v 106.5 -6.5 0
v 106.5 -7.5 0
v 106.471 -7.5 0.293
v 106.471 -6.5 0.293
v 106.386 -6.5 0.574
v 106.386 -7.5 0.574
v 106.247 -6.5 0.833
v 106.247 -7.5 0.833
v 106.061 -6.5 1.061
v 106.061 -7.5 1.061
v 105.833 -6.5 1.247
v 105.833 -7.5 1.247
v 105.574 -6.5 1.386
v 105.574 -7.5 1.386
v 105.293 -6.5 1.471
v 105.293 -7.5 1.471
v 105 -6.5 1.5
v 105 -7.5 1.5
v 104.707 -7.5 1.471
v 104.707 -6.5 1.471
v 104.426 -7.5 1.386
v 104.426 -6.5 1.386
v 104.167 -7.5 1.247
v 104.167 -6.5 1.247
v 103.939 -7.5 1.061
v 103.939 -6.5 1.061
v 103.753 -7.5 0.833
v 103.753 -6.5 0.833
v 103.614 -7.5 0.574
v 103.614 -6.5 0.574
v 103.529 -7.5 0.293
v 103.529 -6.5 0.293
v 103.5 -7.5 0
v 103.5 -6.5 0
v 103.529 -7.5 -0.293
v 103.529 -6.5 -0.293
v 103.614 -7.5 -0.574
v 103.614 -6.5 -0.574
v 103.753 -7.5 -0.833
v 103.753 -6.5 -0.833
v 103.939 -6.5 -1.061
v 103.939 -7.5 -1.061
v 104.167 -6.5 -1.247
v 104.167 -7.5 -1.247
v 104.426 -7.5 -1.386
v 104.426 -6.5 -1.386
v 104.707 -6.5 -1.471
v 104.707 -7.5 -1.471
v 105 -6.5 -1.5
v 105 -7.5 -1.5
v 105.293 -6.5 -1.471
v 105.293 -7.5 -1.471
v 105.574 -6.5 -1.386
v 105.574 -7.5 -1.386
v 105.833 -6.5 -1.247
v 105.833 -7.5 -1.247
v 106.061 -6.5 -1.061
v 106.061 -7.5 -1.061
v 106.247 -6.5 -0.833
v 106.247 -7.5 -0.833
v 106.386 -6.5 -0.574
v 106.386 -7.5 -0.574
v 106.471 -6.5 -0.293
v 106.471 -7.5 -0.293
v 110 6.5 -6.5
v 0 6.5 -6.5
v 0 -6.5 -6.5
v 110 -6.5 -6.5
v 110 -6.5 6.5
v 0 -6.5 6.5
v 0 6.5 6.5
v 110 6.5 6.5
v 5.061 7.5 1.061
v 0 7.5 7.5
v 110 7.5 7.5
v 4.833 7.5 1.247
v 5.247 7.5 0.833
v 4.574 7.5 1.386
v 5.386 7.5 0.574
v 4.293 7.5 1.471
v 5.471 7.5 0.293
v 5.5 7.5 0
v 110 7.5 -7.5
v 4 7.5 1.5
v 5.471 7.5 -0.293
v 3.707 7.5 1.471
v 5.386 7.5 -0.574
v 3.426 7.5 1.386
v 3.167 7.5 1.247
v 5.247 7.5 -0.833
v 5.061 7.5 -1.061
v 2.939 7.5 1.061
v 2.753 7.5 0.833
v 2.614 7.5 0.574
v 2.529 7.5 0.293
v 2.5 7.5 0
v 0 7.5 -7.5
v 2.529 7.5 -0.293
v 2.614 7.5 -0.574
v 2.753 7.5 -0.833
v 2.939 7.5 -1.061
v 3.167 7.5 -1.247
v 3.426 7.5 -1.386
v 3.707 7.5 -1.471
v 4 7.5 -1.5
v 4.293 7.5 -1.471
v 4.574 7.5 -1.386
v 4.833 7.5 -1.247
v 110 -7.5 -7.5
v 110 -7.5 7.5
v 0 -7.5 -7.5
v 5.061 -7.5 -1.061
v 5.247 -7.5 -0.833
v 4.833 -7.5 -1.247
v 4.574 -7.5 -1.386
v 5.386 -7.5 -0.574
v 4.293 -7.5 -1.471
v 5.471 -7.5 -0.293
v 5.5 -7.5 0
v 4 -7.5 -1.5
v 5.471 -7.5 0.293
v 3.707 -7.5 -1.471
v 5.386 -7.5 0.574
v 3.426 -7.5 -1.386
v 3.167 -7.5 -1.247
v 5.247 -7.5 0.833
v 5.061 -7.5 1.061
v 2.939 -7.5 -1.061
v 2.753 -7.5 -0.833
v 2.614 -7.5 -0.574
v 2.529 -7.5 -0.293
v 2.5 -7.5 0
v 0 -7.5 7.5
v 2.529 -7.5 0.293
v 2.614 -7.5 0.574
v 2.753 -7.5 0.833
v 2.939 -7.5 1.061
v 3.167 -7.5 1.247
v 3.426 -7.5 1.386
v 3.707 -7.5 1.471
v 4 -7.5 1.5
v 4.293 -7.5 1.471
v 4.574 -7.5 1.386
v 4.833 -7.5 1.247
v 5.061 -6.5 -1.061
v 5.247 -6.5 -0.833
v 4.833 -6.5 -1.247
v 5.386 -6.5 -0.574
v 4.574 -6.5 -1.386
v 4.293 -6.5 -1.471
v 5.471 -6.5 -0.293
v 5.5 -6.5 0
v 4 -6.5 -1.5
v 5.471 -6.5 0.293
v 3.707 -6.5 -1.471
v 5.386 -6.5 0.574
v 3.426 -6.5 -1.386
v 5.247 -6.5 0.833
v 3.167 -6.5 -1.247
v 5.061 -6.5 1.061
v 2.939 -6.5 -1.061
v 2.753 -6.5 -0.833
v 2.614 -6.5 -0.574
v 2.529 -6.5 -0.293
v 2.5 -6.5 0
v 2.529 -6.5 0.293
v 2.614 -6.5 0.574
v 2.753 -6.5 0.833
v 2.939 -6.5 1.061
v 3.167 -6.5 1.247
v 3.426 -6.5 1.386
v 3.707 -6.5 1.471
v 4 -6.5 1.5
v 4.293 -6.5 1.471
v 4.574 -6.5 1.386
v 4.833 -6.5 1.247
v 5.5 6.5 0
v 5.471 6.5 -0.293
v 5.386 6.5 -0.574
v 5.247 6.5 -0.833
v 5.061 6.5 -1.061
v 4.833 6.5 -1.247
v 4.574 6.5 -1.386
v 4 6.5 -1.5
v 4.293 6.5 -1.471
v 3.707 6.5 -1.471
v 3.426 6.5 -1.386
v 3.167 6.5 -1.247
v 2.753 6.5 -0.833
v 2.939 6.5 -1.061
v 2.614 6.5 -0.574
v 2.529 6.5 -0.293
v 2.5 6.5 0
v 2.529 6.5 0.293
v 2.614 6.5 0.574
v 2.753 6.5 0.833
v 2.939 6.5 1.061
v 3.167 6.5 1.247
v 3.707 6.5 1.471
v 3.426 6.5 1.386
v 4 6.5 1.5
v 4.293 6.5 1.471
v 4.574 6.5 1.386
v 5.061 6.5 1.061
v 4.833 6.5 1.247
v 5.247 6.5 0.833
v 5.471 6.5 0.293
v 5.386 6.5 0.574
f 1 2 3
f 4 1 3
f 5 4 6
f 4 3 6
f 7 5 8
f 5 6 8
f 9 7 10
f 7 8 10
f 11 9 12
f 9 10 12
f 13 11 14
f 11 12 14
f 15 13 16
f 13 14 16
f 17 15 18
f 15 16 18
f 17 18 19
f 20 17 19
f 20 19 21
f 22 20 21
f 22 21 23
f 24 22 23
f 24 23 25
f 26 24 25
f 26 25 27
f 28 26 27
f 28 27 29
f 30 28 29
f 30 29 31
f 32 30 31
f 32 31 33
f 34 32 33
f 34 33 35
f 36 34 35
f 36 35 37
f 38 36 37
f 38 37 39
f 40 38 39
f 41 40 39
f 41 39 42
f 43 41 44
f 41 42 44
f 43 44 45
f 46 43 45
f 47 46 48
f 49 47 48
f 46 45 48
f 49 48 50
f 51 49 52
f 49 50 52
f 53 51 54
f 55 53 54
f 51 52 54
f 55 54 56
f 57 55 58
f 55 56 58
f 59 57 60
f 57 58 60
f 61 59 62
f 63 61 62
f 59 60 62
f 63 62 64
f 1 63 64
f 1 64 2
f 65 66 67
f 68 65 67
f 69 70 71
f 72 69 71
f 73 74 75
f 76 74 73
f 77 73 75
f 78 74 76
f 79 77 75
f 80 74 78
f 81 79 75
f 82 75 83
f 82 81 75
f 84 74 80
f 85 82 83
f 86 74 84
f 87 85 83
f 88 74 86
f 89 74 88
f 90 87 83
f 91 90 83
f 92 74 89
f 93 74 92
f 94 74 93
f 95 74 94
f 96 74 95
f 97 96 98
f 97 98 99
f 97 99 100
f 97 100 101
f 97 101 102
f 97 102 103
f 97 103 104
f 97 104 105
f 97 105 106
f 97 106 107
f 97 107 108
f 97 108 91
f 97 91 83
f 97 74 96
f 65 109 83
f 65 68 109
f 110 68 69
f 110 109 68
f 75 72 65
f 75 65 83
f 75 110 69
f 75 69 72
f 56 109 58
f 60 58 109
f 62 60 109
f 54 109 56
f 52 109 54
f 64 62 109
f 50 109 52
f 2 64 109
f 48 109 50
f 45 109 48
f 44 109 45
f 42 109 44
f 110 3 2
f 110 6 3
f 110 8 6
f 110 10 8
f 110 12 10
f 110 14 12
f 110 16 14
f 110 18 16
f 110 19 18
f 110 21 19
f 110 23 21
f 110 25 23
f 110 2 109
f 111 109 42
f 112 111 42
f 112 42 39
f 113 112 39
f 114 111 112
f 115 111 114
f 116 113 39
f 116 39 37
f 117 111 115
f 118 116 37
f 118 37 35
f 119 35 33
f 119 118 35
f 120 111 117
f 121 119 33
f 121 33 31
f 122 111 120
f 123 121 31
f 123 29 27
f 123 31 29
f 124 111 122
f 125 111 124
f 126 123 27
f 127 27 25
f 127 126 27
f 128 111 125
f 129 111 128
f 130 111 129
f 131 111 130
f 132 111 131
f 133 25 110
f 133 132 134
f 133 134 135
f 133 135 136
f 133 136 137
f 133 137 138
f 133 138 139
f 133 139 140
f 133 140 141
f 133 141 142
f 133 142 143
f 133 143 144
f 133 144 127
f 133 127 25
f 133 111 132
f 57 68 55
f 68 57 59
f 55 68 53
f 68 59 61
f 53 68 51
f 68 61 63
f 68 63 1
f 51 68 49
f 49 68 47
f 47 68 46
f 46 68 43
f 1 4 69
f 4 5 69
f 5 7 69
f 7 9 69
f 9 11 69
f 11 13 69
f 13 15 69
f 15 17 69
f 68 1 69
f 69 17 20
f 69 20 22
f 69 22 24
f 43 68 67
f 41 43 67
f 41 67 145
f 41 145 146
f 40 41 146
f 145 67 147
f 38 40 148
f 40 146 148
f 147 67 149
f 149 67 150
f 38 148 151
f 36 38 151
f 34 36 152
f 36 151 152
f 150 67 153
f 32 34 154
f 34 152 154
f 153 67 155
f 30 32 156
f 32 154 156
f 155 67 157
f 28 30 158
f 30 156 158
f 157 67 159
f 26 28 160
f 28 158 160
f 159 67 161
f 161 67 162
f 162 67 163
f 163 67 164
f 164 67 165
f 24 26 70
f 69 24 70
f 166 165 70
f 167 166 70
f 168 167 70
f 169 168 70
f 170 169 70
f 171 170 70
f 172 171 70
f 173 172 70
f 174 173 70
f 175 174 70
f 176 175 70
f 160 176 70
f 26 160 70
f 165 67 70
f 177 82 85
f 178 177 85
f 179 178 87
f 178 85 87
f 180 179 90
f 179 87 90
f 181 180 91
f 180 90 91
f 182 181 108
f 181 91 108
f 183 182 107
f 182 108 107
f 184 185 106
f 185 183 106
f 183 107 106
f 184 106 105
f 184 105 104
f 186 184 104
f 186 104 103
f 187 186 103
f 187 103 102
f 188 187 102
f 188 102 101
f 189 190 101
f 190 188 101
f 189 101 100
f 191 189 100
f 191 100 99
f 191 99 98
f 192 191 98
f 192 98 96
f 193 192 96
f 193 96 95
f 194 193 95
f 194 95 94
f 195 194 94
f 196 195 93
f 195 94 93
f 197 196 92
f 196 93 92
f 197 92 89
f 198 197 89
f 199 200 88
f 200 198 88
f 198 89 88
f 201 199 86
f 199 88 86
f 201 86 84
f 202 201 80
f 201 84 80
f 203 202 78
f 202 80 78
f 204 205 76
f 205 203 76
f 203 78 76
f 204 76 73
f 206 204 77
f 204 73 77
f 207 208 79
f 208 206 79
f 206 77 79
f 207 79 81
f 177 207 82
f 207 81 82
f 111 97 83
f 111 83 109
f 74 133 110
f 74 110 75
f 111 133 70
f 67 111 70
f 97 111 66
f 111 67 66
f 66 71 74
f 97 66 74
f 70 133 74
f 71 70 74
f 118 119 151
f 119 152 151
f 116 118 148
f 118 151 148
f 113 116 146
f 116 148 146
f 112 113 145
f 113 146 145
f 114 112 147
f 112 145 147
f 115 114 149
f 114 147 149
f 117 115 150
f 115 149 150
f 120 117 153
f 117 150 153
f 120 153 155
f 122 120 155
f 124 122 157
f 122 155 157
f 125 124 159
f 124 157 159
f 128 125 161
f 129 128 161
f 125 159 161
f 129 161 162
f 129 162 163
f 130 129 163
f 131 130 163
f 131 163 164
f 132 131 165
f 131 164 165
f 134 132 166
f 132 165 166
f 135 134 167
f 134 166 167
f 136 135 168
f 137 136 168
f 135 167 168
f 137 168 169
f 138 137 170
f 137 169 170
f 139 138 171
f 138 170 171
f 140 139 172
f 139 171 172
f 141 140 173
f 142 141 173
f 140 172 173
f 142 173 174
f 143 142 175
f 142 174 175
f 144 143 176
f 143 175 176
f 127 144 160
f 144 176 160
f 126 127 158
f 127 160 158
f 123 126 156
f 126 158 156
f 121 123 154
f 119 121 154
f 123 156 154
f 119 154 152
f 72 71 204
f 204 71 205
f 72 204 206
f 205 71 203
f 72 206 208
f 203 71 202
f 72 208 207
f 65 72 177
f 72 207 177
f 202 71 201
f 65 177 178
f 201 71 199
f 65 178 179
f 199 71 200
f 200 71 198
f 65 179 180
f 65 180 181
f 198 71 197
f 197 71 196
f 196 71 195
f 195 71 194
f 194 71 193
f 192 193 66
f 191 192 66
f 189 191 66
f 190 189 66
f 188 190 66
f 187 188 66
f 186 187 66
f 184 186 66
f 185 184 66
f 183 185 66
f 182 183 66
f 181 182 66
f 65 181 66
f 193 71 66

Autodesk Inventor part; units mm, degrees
ref_plane "YZ Plane" through (0, 0, 0) normal (1, 0, 0) x (0, 1, 0)
ref_plane "XZ Plane" through (0, 0, 0) normal (0, 1, 0) x (-1, 0, 0)
ref_plane "XY Plane" through (0, 0, 0) normal (0, 0, 1) x (1, 0, 0)
sketch "Sketch1" plane through (0, 0, 0) normal (1, 0, 0) x (0, 1, 0)
  line L0 (-7.5, 7.5) -> (7.5, 7.5)
  line L1 (7.5, 7.5) -> (7.5, -7.5)
  line L2 (7.5, -7.5) -> (-7.5, -7.5)
  line L3 (-7.5, -7.5) -> (-7.5, 7.5)
  line L4 (-7.5, 7.5) -> (7.5, -7.5) construction
  line L5 (7.5, 7.5) -> (-7.5, -7.5) construction
  line L6 (-6.5, 6.5) -> (6.5, 6.5)
  line L7 (6.5, 6.5) -> (6.5, -6.5)
  line L8 (6.5, -6.5) -> (-6.5, -6.5)
  line L9 (-6.5, -6.5) -> (-6.5, 6.5)
  line L10 (-6.5, 6.5) -> (6.5, -6.5) construction
  line L11 (6.5, 6.5) -> (-6.5, -6.5) construction
  point P0 (0, 0)
  dimension "d0" = 15
  dimension "d1" = 15
  dimension "d2" = 13
  dimension "d3" = 13
extrude "Extrusion1" add sketch "Sketch1" along normal blind 110
sketch "Sketch2" plane through (0, 7.5, 7.5) normal (0, 1, 0) x (1, 0, 0)
  line L0 (0, 7.5) -> (4, 7.5)
  circle A0 centre (4, 7.5) radius 1.5
  dimension "d6" = 4
  dimension "d7" = 3
extrude "Extrusion2" cut sketch "Sketch2" against normal through all
sketch "Sketch3" plane through (0, -7.5, -7.5) normal (0, -1, 0) x (1, 0, 0)
  line L0 (110, 1) -> (110, 14) projected
  line L1 (110, 7.5) -> (105, 7.5)
  circle A0 centre (105, 7.5) radius 1.5
  point P0 (0, 7.5)
  dimension "d10" = 5
  dimension "d11" = 3
extrude "Extrusion3" cut sketch "Sketch3" against normal up to next
properties part number "front_arm_rect" material "Aluminum 6061"
